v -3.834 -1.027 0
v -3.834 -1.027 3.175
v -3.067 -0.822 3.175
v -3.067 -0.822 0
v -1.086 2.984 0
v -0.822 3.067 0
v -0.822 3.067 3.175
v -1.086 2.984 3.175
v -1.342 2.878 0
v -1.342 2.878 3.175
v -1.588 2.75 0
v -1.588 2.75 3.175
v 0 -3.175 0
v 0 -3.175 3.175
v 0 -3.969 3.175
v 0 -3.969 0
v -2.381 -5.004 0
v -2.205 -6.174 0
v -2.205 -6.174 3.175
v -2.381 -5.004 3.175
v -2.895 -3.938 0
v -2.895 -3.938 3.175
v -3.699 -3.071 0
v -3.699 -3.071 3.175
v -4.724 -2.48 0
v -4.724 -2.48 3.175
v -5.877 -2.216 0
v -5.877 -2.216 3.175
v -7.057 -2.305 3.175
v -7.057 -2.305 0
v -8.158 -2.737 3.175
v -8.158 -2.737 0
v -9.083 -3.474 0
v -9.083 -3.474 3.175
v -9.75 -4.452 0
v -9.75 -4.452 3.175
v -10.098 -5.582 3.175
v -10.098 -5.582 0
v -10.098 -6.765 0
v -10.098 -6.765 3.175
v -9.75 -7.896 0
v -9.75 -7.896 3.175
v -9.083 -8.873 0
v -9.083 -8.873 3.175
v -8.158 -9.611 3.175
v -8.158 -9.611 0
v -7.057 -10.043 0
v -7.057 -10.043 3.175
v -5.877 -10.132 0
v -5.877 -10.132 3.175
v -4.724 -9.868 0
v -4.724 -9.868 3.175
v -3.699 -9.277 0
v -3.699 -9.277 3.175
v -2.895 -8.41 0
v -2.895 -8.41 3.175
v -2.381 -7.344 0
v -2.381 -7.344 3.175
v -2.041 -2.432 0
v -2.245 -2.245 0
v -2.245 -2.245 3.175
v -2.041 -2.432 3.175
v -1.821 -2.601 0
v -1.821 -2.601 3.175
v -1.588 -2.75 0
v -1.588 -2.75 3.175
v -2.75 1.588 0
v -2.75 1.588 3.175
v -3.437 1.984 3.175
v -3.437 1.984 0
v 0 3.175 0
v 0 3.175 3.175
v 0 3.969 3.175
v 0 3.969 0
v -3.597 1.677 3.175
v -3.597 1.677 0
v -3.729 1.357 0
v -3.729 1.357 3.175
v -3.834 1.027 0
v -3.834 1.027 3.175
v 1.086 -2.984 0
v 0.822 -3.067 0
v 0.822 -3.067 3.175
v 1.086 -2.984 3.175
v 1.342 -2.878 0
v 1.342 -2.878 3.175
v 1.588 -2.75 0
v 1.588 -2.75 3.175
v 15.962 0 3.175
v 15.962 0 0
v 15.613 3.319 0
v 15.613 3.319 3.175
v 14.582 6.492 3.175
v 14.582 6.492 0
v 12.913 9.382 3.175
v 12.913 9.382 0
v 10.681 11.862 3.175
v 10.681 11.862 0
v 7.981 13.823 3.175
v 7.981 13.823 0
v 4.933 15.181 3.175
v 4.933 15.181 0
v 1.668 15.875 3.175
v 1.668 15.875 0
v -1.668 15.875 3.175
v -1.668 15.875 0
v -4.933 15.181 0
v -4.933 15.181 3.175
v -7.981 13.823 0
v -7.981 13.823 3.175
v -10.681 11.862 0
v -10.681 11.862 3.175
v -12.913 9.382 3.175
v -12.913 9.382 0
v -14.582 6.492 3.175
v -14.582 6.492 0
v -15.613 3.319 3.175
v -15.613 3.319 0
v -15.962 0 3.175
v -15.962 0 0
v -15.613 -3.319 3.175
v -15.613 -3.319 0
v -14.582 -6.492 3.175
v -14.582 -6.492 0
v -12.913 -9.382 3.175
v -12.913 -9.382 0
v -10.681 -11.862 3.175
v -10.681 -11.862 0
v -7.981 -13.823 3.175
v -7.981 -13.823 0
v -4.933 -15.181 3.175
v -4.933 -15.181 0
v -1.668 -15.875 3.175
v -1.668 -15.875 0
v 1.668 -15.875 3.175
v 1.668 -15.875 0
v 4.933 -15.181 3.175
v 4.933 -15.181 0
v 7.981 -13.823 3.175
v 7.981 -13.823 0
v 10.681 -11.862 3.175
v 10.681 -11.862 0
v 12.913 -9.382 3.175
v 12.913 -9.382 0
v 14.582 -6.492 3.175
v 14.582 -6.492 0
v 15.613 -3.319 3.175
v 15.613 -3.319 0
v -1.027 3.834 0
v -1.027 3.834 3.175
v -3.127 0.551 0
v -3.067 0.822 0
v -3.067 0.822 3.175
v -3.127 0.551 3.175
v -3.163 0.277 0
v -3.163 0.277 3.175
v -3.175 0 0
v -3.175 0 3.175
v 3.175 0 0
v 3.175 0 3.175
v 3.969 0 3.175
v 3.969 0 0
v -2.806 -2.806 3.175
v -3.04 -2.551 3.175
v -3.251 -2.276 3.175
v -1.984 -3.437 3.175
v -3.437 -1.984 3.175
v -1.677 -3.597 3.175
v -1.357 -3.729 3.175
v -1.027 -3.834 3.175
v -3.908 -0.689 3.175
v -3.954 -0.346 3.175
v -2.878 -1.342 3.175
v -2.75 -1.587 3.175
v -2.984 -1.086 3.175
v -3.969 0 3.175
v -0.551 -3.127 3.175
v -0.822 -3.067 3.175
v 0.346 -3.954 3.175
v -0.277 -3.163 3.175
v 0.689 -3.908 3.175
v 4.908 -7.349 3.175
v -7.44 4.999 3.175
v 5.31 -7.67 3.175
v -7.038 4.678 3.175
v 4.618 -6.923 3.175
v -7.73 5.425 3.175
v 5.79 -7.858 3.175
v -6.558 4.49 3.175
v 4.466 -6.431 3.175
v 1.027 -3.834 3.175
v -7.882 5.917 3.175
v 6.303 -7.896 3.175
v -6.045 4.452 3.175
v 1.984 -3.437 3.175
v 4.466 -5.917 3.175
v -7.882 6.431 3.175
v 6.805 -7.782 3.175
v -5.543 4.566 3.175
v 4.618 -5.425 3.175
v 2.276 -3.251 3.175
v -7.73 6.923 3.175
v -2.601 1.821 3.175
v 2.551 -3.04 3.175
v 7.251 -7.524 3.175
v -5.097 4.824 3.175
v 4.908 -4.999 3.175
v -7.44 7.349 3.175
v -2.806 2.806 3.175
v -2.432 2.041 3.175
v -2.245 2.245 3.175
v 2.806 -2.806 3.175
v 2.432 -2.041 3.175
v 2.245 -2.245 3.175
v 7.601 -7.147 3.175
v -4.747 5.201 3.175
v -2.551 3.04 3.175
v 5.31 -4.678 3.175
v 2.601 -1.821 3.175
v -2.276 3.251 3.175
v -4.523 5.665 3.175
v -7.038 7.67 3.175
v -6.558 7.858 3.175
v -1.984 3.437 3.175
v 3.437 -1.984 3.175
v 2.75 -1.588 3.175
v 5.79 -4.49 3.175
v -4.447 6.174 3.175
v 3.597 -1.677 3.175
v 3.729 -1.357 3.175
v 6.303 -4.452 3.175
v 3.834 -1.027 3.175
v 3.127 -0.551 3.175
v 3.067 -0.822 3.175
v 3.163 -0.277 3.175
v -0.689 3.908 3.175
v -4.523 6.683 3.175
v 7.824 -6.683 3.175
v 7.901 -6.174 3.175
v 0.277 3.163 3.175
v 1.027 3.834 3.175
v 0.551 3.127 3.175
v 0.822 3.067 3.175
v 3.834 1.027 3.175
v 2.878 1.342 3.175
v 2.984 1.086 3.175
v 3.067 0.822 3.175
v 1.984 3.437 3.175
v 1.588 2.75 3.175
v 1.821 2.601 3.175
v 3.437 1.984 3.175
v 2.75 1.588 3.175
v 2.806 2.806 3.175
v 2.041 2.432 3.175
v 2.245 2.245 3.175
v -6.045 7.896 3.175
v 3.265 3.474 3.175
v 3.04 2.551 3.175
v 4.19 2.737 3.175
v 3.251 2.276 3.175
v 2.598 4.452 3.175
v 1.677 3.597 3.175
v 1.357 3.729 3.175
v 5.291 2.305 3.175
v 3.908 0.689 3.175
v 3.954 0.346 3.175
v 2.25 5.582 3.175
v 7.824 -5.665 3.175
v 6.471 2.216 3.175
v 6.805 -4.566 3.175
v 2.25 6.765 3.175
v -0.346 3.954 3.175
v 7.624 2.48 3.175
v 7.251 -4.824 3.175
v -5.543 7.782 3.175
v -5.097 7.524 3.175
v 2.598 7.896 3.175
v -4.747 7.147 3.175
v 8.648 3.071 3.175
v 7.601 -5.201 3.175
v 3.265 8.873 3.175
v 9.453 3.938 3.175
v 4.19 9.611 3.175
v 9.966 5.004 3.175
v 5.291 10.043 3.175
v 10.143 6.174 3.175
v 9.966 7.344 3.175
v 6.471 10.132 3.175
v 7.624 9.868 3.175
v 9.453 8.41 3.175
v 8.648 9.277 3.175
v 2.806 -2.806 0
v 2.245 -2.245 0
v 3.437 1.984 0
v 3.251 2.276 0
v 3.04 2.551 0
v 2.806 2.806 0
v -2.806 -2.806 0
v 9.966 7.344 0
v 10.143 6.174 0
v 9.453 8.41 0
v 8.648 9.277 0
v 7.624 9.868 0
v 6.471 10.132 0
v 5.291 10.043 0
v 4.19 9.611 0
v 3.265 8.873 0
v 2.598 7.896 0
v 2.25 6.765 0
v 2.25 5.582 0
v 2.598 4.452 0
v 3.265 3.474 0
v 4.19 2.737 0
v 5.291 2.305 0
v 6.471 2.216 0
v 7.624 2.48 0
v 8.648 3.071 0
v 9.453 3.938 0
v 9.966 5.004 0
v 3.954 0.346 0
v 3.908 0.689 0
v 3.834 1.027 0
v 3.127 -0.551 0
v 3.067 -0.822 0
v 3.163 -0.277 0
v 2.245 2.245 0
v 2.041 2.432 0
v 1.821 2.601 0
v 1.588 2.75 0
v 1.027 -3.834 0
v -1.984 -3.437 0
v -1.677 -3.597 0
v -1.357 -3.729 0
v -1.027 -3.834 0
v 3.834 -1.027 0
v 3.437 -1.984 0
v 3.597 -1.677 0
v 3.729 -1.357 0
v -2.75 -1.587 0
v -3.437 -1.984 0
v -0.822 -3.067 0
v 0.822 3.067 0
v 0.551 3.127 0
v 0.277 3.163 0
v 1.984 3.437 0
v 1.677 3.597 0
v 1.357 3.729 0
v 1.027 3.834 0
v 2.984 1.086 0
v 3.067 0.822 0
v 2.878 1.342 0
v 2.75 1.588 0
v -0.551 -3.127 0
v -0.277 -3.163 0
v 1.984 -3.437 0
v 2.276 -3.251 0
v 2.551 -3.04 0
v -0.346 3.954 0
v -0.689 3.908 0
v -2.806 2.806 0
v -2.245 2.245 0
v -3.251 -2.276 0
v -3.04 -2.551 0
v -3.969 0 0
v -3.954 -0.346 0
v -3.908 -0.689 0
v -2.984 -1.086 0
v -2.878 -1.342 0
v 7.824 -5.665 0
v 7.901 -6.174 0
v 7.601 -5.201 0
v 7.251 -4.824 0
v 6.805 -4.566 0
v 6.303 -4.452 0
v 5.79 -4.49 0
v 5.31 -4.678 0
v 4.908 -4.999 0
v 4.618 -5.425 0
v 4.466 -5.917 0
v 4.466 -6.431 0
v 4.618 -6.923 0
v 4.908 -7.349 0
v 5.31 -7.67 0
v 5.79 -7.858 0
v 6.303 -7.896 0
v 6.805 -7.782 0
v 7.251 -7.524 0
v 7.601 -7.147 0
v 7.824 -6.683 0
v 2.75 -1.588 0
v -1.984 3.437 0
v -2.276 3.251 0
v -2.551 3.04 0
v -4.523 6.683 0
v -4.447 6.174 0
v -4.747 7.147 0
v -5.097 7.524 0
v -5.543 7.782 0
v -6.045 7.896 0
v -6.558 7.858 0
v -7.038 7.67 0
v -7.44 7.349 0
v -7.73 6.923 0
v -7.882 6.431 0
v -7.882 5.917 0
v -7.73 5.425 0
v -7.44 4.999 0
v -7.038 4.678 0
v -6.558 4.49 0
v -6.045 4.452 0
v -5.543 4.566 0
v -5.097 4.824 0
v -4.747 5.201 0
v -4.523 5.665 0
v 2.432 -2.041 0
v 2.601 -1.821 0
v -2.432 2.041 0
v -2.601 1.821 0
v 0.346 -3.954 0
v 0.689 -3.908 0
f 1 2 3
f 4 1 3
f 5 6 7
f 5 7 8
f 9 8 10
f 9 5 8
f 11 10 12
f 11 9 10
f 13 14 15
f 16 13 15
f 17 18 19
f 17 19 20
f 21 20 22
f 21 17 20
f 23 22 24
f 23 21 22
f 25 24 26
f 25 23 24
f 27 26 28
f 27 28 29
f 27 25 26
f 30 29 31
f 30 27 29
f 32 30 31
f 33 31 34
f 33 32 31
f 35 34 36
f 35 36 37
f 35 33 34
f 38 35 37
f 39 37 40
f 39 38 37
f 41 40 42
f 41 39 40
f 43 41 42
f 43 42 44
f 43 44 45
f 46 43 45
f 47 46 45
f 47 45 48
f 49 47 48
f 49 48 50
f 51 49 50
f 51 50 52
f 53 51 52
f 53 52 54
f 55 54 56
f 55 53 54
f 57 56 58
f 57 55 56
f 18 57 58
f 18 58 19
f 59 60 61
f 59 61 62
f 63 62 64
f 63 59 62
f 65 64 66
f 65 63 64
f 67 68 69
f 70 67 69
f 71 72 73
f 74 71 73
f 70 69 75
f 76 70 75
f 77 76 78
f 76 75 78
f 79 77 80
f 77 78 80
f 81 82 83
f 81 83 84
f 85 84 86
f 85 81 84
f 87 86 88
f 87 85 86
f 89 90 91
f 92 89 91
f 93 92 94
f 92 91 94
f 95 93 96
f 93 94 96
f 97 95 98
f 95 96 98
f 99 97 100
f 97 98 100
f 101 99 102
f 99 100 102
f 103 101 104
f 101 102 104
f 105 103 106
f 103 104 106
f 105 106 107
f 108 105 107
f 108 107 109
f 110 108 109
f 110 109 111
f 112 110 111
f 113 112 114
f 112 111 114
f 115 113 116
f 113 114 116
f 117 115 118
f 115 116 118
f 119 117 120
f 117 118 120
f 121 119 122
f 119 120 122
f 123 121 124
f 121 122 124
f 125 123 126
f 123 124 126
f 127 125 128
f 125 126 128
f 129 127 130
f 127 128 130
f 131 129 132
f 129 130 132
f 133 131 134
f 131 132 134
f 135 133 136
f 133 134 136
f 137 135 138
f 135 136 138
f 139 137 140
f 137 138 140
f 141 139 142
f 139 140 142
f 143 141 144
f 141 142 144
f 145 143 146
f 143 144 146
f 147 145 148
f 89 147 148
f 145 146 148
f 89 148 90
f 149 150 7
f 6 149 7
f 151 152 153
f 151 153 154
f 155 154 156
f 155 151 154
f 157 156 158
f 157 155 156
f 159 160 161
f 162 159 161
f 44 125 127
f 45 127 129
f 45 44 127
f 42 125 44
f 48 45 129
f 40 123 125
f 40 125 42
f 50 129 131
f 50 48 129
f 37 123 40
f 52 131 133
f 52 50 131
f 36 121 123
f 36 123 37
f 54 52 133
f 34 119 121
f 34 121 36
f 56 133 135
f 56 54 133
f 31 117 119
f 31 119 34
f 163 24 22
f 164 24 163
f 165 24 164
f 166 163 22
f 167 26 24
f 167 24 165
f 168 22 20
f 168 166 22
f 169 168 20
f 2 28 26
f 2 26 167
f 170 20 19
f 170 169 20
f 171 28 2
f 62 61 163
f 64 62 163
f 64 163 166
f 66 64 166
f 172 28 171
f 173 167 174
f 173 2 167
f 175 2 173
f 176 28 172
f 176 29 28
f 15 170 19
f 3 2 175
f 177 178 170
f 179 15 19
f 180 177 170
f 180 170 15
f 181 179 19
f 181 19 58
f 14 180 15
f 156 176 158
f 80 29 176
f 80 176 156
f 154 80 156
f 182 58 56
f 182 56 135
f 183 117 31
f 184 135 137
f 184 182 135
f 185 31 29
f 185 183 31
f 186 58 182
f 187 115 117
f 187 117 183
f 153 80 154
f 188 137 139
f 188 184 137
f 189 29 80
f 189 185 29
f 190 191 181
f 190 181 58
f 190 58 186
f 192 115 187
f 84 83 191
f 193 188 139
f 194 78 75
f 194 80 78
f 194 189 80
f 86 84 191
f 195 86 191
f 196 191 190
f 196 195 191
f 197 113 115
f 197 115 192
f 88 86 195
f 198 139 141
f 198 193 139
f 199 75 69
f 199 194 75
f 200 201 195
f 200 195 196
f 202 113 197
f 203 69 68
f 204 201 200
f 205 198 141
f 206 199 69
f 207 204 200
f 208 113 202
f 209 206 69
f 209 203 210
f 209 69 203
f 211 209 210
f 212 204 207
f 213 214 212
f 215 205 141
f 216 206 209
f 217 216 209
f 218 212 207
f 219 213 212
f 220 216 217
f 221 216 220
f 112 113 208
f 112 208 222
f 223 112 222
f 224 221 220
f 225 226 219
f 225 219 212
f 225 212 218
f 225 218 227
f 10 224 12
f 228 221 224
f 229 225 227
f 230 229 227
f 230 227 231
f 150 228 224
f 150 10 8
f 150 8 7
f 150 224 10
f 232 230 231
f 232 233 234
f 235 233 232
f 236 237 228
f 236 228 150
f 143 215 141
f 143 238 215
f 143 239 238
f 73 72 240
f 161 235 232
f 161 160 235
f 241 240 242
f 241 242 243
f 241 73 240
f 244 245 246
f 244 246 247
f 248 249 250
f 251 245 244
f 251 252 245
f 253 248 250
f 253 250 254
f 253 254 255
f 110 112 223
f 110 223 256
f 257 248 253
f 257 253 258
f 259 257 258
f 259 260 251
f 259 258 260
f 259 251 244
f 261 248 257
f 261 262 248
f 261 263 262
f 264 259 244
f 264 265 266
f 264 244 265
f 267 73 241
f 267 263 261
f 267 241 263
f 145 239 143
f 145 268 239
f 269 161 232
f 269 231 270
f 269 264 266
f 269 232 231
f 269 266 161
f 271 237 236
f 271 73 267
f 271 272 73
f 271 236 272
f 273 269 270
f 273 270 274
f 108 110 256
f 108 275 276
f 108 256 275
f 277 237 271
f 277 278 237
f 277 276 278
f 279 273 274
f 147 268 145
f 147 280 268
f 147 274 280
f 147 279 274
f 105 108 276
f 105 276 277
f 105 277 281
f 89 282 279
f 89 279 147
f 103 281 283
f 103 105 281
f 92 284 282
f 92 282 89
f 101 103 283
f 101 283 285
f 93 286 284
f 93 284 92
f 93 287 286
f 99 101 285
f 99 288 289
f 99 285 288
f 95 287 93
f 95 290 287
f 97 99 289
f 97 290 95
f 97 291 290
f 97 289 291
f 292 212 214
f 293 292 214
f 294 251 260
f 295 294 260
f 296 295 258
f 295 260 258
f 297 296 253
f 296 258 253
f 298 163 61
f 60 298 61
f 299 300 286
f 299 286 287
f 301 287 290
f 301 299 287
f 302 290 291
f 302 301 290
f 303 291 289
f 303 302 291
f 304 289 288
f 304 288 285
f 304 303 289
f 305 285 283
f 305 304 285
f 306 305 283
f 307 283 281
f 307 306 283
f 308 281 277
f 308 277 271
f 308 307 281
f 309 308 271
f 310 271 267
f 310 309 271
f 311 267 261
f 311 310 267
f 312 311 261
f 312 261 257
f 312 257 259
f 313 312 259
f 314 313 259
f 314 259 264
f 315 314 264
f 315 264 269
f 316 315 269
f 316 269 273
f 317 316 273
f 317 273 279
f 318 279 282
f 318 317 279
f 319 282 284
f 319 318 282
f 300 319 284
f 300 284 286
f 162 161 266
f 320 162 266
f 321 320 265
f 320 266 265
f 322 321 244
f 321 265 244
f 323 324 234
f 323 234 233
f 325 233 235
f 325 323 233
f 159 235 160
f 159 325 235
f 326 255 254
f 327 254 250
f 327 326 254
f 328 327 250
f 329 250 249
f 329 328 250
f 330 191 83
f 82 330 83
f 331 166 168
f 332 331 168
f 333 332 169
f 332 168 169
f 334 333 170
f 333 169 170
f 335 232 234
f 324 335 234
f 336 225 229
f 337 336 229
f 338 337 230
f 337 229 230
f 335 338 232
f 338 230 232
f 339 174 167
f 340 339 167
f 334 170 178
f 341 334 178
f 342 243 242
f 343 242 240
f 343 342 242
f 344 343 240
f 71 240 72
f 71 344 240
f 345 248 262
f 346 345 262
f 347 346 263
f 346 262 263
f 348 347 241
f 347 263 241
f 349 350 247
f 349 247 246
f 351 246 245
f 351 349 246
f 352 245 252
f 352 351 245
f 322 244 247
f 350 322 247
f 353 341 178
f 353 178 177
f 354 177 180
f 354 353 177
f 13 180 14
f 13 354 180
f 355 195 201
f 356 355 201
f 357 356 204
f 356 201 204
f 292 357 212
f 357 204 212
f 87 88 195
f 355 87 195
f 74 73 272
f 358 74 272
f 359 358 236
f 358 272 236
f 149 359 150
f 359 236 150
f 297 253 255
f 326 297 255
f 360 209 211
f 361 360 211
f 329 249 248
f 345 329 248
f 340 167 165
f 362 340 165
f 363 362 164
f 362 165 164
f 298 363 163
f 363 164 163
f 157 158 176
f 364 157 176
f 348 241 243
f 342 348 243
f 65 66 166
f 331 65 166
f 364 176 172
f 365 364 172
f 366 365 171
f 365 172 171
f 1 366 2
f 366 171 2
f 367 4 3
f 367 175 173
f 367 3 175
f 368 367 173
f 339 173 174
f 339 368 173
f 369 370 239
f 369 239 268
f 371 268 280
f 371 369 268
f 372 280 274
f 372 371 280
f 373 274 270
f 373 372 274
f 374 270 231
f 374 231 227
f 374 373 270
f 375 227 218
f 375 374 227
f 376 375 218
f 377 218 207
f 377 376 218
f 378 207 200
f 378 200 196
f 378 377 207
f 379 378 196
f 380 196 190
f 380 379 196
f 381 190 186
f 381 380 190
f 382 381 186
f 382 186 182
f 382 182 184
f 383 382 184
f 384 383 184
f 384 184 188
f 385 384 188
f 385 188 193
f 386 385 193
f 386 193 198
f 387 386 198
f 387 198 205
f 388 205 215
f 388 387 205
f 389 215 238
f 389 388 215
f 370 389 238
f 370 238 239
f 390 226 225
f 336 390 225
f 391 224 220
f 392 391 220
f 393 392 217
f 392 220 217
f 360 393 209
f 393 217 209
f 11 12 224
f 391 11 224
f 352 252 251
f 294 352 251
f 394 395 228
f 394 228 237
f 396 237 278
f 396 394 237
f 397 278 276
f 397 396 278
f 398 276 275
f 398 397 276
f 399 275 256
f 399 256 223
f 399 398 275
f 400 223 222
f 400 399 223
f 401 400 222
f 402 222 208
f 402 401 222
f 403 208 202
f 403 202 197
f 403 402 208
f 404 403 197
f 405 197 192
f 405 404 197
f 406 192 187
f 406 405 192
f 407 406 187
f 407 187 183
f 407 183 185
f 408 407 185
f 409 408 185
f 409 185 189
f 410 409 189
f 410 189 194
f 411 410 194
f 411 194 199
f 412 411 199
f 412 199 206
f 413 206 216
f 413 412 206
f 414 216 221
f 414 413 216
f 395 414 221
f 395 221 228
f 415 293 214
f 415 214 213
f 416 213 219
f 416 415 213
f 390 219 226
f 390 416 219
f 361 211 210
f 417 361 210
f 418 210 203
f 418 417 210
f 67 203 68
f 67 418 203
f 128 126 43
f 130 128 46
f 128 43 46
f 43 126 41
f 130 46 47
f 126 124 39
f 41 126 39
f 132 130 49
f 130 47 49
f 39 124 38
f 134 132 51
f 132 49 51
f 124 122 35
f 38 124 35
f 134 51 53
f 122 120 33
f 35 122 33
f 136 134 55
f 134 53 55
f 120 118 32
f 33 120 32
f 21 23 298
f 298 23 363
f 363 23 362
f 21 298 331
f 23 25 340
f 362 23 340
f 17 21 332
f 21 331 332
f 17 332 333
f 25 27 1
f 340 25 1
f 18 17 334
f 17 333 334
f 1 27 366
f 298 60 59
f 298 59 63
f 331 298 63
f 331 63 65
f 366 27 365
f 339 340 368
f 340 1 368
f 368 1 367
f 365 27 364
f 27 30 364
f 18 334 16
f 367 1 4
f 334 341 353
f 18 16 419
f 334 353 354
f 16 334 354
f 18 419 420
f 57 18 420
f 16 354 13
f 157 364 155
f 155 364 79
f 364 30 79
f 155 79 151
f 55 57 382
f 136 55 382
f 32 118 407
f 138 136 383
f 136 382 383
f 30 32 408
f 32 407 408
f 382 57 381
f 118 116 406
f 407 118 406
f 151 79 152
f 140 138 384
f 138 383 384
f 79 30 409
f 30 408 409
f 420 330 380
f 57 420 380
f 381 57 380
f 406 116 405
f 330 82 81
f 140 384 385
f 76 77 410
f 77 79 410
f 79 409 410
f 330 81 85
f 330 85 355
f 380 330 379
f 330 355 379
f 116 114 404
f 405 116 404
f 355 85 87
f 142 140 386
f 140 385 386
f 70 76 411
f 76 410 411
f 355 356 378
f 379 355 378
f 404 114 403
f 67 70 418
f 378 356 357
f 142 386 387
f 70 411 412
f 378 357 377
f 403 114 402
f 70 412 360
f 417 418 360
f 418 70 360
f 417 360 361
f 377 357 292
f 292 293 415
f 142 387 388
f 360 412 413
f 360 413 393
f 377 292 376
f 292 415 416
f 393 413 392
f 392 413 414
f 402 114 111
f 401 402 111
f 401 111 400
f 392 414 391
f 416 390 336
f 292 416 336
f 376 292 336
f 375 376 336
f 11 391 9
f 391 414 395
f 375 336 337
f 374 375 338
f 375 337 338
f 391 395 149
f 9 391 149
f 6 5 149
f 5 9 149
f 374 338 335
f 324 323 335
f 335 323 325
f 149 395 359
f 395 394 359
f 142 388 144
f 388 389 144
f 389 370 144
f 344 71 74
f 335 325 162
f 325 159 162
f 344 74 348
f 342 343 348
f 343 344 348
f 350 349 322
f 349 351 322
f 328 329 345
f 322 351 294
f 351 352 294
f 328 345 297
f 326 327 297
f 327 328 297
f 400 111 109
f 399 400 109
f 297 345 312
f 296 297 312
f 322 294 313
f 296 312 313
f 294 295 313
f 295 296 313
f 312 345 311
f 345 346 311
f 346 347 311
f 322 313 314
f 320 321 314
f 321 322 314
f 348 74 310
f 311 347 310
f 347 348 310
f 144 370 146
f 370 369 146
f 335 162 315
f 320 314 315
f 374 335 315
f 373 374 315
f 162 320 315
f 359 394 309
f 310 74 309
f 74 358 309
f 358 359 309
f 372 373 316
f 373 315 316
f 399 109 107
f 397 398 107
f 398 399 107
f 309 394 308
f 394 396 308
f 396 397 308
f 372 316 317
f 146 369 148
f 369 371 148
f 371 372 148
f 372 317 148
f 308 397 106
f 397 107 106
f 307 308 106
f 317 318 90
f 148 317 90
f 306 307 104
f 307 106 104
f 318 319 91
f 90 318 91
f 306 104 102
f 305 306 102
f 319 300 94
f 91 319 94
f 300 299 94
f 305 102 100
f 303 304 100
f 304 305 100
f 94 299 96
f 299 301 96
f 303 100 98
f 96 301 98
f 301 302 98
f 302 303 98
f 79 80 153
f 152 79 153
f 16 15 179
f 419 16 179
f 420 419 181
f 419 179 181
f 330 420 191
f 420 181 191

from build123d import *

# Parameters (mm, degrees)
F0_R            = 15.961960717
F0_R_2          = 3.96875
F0_R_3          = 3.175
F0_R_4          = 1.7272
F1_DEPTH        = 3.175
F3_DEPTH        = 3.175
F3_COPIES_COUNT = 12


# Not quite as in the source:
# - a pattern or mirror of a feature is missing from the dataset's text; its kind, count and spacing are read off the source's solid


with BuildPart() as f1:
    # F0 (on Top) → F1 (new body)
    with BuildSketch(Plane.XY):
        Circle(F0_R)
        with Locations((-6.1739260832, -6.1739260832)):
            Circle(F0_R_2, mode=Mode.SUBTRACT)
        Circle(F0_R_3, mode=Mode.SUBTRACT)
        with Locations((6.1739260832, -6.1739260832)):
            Circle(F0_R_4, mode=Mode.SUBTRACT)
        with Locations((-6.1739260832, 6.1739260832)):
            Circle(F0_R_4, mode=Mode.SUBTRACT)
        with Locations((6.1739260832, 6.1739260832)):
            Circle(F0_R_2, mode=Mode.SUBTRACT)
    extrude(amount=F1_DEPTH)

    # F2 (on face) → F3 (cut, through all)
    with BuildSketch(Plane.XY.offset(3.175)):
        with BuildLine():
            Line((-1.0271880853, 3.8335181231), (-0.8217504682, 3.0668144985))
            ThreePointArc((-0.8217504682, 3.0668144985), (-0.4144206603, 3.1478374349), (0, 3.175))
            Line((0, 3.175), (0, 3.96875))
            ThreePointArc((0, 3.96875), (-0.5180258254, 3.9347967936), (-1.0271880853, 3.8335181231))
        make_face()
    f3 = extrude(amount=-F3_DEPTH, mode=Mode.SUBTRACT)

    # F3_copies: F3 ×12 about axis
    f3_copies_axis = Axis((0, 0, 0), (0, 0, 1))
    for i in range(1, F3_COPIES_COUNT):
        add(f3.rotate(f3_copies_axis, i * 360 / F3_COPIES_COUNT), mode=Mode.SUBTRACT)


solid = f1.part
